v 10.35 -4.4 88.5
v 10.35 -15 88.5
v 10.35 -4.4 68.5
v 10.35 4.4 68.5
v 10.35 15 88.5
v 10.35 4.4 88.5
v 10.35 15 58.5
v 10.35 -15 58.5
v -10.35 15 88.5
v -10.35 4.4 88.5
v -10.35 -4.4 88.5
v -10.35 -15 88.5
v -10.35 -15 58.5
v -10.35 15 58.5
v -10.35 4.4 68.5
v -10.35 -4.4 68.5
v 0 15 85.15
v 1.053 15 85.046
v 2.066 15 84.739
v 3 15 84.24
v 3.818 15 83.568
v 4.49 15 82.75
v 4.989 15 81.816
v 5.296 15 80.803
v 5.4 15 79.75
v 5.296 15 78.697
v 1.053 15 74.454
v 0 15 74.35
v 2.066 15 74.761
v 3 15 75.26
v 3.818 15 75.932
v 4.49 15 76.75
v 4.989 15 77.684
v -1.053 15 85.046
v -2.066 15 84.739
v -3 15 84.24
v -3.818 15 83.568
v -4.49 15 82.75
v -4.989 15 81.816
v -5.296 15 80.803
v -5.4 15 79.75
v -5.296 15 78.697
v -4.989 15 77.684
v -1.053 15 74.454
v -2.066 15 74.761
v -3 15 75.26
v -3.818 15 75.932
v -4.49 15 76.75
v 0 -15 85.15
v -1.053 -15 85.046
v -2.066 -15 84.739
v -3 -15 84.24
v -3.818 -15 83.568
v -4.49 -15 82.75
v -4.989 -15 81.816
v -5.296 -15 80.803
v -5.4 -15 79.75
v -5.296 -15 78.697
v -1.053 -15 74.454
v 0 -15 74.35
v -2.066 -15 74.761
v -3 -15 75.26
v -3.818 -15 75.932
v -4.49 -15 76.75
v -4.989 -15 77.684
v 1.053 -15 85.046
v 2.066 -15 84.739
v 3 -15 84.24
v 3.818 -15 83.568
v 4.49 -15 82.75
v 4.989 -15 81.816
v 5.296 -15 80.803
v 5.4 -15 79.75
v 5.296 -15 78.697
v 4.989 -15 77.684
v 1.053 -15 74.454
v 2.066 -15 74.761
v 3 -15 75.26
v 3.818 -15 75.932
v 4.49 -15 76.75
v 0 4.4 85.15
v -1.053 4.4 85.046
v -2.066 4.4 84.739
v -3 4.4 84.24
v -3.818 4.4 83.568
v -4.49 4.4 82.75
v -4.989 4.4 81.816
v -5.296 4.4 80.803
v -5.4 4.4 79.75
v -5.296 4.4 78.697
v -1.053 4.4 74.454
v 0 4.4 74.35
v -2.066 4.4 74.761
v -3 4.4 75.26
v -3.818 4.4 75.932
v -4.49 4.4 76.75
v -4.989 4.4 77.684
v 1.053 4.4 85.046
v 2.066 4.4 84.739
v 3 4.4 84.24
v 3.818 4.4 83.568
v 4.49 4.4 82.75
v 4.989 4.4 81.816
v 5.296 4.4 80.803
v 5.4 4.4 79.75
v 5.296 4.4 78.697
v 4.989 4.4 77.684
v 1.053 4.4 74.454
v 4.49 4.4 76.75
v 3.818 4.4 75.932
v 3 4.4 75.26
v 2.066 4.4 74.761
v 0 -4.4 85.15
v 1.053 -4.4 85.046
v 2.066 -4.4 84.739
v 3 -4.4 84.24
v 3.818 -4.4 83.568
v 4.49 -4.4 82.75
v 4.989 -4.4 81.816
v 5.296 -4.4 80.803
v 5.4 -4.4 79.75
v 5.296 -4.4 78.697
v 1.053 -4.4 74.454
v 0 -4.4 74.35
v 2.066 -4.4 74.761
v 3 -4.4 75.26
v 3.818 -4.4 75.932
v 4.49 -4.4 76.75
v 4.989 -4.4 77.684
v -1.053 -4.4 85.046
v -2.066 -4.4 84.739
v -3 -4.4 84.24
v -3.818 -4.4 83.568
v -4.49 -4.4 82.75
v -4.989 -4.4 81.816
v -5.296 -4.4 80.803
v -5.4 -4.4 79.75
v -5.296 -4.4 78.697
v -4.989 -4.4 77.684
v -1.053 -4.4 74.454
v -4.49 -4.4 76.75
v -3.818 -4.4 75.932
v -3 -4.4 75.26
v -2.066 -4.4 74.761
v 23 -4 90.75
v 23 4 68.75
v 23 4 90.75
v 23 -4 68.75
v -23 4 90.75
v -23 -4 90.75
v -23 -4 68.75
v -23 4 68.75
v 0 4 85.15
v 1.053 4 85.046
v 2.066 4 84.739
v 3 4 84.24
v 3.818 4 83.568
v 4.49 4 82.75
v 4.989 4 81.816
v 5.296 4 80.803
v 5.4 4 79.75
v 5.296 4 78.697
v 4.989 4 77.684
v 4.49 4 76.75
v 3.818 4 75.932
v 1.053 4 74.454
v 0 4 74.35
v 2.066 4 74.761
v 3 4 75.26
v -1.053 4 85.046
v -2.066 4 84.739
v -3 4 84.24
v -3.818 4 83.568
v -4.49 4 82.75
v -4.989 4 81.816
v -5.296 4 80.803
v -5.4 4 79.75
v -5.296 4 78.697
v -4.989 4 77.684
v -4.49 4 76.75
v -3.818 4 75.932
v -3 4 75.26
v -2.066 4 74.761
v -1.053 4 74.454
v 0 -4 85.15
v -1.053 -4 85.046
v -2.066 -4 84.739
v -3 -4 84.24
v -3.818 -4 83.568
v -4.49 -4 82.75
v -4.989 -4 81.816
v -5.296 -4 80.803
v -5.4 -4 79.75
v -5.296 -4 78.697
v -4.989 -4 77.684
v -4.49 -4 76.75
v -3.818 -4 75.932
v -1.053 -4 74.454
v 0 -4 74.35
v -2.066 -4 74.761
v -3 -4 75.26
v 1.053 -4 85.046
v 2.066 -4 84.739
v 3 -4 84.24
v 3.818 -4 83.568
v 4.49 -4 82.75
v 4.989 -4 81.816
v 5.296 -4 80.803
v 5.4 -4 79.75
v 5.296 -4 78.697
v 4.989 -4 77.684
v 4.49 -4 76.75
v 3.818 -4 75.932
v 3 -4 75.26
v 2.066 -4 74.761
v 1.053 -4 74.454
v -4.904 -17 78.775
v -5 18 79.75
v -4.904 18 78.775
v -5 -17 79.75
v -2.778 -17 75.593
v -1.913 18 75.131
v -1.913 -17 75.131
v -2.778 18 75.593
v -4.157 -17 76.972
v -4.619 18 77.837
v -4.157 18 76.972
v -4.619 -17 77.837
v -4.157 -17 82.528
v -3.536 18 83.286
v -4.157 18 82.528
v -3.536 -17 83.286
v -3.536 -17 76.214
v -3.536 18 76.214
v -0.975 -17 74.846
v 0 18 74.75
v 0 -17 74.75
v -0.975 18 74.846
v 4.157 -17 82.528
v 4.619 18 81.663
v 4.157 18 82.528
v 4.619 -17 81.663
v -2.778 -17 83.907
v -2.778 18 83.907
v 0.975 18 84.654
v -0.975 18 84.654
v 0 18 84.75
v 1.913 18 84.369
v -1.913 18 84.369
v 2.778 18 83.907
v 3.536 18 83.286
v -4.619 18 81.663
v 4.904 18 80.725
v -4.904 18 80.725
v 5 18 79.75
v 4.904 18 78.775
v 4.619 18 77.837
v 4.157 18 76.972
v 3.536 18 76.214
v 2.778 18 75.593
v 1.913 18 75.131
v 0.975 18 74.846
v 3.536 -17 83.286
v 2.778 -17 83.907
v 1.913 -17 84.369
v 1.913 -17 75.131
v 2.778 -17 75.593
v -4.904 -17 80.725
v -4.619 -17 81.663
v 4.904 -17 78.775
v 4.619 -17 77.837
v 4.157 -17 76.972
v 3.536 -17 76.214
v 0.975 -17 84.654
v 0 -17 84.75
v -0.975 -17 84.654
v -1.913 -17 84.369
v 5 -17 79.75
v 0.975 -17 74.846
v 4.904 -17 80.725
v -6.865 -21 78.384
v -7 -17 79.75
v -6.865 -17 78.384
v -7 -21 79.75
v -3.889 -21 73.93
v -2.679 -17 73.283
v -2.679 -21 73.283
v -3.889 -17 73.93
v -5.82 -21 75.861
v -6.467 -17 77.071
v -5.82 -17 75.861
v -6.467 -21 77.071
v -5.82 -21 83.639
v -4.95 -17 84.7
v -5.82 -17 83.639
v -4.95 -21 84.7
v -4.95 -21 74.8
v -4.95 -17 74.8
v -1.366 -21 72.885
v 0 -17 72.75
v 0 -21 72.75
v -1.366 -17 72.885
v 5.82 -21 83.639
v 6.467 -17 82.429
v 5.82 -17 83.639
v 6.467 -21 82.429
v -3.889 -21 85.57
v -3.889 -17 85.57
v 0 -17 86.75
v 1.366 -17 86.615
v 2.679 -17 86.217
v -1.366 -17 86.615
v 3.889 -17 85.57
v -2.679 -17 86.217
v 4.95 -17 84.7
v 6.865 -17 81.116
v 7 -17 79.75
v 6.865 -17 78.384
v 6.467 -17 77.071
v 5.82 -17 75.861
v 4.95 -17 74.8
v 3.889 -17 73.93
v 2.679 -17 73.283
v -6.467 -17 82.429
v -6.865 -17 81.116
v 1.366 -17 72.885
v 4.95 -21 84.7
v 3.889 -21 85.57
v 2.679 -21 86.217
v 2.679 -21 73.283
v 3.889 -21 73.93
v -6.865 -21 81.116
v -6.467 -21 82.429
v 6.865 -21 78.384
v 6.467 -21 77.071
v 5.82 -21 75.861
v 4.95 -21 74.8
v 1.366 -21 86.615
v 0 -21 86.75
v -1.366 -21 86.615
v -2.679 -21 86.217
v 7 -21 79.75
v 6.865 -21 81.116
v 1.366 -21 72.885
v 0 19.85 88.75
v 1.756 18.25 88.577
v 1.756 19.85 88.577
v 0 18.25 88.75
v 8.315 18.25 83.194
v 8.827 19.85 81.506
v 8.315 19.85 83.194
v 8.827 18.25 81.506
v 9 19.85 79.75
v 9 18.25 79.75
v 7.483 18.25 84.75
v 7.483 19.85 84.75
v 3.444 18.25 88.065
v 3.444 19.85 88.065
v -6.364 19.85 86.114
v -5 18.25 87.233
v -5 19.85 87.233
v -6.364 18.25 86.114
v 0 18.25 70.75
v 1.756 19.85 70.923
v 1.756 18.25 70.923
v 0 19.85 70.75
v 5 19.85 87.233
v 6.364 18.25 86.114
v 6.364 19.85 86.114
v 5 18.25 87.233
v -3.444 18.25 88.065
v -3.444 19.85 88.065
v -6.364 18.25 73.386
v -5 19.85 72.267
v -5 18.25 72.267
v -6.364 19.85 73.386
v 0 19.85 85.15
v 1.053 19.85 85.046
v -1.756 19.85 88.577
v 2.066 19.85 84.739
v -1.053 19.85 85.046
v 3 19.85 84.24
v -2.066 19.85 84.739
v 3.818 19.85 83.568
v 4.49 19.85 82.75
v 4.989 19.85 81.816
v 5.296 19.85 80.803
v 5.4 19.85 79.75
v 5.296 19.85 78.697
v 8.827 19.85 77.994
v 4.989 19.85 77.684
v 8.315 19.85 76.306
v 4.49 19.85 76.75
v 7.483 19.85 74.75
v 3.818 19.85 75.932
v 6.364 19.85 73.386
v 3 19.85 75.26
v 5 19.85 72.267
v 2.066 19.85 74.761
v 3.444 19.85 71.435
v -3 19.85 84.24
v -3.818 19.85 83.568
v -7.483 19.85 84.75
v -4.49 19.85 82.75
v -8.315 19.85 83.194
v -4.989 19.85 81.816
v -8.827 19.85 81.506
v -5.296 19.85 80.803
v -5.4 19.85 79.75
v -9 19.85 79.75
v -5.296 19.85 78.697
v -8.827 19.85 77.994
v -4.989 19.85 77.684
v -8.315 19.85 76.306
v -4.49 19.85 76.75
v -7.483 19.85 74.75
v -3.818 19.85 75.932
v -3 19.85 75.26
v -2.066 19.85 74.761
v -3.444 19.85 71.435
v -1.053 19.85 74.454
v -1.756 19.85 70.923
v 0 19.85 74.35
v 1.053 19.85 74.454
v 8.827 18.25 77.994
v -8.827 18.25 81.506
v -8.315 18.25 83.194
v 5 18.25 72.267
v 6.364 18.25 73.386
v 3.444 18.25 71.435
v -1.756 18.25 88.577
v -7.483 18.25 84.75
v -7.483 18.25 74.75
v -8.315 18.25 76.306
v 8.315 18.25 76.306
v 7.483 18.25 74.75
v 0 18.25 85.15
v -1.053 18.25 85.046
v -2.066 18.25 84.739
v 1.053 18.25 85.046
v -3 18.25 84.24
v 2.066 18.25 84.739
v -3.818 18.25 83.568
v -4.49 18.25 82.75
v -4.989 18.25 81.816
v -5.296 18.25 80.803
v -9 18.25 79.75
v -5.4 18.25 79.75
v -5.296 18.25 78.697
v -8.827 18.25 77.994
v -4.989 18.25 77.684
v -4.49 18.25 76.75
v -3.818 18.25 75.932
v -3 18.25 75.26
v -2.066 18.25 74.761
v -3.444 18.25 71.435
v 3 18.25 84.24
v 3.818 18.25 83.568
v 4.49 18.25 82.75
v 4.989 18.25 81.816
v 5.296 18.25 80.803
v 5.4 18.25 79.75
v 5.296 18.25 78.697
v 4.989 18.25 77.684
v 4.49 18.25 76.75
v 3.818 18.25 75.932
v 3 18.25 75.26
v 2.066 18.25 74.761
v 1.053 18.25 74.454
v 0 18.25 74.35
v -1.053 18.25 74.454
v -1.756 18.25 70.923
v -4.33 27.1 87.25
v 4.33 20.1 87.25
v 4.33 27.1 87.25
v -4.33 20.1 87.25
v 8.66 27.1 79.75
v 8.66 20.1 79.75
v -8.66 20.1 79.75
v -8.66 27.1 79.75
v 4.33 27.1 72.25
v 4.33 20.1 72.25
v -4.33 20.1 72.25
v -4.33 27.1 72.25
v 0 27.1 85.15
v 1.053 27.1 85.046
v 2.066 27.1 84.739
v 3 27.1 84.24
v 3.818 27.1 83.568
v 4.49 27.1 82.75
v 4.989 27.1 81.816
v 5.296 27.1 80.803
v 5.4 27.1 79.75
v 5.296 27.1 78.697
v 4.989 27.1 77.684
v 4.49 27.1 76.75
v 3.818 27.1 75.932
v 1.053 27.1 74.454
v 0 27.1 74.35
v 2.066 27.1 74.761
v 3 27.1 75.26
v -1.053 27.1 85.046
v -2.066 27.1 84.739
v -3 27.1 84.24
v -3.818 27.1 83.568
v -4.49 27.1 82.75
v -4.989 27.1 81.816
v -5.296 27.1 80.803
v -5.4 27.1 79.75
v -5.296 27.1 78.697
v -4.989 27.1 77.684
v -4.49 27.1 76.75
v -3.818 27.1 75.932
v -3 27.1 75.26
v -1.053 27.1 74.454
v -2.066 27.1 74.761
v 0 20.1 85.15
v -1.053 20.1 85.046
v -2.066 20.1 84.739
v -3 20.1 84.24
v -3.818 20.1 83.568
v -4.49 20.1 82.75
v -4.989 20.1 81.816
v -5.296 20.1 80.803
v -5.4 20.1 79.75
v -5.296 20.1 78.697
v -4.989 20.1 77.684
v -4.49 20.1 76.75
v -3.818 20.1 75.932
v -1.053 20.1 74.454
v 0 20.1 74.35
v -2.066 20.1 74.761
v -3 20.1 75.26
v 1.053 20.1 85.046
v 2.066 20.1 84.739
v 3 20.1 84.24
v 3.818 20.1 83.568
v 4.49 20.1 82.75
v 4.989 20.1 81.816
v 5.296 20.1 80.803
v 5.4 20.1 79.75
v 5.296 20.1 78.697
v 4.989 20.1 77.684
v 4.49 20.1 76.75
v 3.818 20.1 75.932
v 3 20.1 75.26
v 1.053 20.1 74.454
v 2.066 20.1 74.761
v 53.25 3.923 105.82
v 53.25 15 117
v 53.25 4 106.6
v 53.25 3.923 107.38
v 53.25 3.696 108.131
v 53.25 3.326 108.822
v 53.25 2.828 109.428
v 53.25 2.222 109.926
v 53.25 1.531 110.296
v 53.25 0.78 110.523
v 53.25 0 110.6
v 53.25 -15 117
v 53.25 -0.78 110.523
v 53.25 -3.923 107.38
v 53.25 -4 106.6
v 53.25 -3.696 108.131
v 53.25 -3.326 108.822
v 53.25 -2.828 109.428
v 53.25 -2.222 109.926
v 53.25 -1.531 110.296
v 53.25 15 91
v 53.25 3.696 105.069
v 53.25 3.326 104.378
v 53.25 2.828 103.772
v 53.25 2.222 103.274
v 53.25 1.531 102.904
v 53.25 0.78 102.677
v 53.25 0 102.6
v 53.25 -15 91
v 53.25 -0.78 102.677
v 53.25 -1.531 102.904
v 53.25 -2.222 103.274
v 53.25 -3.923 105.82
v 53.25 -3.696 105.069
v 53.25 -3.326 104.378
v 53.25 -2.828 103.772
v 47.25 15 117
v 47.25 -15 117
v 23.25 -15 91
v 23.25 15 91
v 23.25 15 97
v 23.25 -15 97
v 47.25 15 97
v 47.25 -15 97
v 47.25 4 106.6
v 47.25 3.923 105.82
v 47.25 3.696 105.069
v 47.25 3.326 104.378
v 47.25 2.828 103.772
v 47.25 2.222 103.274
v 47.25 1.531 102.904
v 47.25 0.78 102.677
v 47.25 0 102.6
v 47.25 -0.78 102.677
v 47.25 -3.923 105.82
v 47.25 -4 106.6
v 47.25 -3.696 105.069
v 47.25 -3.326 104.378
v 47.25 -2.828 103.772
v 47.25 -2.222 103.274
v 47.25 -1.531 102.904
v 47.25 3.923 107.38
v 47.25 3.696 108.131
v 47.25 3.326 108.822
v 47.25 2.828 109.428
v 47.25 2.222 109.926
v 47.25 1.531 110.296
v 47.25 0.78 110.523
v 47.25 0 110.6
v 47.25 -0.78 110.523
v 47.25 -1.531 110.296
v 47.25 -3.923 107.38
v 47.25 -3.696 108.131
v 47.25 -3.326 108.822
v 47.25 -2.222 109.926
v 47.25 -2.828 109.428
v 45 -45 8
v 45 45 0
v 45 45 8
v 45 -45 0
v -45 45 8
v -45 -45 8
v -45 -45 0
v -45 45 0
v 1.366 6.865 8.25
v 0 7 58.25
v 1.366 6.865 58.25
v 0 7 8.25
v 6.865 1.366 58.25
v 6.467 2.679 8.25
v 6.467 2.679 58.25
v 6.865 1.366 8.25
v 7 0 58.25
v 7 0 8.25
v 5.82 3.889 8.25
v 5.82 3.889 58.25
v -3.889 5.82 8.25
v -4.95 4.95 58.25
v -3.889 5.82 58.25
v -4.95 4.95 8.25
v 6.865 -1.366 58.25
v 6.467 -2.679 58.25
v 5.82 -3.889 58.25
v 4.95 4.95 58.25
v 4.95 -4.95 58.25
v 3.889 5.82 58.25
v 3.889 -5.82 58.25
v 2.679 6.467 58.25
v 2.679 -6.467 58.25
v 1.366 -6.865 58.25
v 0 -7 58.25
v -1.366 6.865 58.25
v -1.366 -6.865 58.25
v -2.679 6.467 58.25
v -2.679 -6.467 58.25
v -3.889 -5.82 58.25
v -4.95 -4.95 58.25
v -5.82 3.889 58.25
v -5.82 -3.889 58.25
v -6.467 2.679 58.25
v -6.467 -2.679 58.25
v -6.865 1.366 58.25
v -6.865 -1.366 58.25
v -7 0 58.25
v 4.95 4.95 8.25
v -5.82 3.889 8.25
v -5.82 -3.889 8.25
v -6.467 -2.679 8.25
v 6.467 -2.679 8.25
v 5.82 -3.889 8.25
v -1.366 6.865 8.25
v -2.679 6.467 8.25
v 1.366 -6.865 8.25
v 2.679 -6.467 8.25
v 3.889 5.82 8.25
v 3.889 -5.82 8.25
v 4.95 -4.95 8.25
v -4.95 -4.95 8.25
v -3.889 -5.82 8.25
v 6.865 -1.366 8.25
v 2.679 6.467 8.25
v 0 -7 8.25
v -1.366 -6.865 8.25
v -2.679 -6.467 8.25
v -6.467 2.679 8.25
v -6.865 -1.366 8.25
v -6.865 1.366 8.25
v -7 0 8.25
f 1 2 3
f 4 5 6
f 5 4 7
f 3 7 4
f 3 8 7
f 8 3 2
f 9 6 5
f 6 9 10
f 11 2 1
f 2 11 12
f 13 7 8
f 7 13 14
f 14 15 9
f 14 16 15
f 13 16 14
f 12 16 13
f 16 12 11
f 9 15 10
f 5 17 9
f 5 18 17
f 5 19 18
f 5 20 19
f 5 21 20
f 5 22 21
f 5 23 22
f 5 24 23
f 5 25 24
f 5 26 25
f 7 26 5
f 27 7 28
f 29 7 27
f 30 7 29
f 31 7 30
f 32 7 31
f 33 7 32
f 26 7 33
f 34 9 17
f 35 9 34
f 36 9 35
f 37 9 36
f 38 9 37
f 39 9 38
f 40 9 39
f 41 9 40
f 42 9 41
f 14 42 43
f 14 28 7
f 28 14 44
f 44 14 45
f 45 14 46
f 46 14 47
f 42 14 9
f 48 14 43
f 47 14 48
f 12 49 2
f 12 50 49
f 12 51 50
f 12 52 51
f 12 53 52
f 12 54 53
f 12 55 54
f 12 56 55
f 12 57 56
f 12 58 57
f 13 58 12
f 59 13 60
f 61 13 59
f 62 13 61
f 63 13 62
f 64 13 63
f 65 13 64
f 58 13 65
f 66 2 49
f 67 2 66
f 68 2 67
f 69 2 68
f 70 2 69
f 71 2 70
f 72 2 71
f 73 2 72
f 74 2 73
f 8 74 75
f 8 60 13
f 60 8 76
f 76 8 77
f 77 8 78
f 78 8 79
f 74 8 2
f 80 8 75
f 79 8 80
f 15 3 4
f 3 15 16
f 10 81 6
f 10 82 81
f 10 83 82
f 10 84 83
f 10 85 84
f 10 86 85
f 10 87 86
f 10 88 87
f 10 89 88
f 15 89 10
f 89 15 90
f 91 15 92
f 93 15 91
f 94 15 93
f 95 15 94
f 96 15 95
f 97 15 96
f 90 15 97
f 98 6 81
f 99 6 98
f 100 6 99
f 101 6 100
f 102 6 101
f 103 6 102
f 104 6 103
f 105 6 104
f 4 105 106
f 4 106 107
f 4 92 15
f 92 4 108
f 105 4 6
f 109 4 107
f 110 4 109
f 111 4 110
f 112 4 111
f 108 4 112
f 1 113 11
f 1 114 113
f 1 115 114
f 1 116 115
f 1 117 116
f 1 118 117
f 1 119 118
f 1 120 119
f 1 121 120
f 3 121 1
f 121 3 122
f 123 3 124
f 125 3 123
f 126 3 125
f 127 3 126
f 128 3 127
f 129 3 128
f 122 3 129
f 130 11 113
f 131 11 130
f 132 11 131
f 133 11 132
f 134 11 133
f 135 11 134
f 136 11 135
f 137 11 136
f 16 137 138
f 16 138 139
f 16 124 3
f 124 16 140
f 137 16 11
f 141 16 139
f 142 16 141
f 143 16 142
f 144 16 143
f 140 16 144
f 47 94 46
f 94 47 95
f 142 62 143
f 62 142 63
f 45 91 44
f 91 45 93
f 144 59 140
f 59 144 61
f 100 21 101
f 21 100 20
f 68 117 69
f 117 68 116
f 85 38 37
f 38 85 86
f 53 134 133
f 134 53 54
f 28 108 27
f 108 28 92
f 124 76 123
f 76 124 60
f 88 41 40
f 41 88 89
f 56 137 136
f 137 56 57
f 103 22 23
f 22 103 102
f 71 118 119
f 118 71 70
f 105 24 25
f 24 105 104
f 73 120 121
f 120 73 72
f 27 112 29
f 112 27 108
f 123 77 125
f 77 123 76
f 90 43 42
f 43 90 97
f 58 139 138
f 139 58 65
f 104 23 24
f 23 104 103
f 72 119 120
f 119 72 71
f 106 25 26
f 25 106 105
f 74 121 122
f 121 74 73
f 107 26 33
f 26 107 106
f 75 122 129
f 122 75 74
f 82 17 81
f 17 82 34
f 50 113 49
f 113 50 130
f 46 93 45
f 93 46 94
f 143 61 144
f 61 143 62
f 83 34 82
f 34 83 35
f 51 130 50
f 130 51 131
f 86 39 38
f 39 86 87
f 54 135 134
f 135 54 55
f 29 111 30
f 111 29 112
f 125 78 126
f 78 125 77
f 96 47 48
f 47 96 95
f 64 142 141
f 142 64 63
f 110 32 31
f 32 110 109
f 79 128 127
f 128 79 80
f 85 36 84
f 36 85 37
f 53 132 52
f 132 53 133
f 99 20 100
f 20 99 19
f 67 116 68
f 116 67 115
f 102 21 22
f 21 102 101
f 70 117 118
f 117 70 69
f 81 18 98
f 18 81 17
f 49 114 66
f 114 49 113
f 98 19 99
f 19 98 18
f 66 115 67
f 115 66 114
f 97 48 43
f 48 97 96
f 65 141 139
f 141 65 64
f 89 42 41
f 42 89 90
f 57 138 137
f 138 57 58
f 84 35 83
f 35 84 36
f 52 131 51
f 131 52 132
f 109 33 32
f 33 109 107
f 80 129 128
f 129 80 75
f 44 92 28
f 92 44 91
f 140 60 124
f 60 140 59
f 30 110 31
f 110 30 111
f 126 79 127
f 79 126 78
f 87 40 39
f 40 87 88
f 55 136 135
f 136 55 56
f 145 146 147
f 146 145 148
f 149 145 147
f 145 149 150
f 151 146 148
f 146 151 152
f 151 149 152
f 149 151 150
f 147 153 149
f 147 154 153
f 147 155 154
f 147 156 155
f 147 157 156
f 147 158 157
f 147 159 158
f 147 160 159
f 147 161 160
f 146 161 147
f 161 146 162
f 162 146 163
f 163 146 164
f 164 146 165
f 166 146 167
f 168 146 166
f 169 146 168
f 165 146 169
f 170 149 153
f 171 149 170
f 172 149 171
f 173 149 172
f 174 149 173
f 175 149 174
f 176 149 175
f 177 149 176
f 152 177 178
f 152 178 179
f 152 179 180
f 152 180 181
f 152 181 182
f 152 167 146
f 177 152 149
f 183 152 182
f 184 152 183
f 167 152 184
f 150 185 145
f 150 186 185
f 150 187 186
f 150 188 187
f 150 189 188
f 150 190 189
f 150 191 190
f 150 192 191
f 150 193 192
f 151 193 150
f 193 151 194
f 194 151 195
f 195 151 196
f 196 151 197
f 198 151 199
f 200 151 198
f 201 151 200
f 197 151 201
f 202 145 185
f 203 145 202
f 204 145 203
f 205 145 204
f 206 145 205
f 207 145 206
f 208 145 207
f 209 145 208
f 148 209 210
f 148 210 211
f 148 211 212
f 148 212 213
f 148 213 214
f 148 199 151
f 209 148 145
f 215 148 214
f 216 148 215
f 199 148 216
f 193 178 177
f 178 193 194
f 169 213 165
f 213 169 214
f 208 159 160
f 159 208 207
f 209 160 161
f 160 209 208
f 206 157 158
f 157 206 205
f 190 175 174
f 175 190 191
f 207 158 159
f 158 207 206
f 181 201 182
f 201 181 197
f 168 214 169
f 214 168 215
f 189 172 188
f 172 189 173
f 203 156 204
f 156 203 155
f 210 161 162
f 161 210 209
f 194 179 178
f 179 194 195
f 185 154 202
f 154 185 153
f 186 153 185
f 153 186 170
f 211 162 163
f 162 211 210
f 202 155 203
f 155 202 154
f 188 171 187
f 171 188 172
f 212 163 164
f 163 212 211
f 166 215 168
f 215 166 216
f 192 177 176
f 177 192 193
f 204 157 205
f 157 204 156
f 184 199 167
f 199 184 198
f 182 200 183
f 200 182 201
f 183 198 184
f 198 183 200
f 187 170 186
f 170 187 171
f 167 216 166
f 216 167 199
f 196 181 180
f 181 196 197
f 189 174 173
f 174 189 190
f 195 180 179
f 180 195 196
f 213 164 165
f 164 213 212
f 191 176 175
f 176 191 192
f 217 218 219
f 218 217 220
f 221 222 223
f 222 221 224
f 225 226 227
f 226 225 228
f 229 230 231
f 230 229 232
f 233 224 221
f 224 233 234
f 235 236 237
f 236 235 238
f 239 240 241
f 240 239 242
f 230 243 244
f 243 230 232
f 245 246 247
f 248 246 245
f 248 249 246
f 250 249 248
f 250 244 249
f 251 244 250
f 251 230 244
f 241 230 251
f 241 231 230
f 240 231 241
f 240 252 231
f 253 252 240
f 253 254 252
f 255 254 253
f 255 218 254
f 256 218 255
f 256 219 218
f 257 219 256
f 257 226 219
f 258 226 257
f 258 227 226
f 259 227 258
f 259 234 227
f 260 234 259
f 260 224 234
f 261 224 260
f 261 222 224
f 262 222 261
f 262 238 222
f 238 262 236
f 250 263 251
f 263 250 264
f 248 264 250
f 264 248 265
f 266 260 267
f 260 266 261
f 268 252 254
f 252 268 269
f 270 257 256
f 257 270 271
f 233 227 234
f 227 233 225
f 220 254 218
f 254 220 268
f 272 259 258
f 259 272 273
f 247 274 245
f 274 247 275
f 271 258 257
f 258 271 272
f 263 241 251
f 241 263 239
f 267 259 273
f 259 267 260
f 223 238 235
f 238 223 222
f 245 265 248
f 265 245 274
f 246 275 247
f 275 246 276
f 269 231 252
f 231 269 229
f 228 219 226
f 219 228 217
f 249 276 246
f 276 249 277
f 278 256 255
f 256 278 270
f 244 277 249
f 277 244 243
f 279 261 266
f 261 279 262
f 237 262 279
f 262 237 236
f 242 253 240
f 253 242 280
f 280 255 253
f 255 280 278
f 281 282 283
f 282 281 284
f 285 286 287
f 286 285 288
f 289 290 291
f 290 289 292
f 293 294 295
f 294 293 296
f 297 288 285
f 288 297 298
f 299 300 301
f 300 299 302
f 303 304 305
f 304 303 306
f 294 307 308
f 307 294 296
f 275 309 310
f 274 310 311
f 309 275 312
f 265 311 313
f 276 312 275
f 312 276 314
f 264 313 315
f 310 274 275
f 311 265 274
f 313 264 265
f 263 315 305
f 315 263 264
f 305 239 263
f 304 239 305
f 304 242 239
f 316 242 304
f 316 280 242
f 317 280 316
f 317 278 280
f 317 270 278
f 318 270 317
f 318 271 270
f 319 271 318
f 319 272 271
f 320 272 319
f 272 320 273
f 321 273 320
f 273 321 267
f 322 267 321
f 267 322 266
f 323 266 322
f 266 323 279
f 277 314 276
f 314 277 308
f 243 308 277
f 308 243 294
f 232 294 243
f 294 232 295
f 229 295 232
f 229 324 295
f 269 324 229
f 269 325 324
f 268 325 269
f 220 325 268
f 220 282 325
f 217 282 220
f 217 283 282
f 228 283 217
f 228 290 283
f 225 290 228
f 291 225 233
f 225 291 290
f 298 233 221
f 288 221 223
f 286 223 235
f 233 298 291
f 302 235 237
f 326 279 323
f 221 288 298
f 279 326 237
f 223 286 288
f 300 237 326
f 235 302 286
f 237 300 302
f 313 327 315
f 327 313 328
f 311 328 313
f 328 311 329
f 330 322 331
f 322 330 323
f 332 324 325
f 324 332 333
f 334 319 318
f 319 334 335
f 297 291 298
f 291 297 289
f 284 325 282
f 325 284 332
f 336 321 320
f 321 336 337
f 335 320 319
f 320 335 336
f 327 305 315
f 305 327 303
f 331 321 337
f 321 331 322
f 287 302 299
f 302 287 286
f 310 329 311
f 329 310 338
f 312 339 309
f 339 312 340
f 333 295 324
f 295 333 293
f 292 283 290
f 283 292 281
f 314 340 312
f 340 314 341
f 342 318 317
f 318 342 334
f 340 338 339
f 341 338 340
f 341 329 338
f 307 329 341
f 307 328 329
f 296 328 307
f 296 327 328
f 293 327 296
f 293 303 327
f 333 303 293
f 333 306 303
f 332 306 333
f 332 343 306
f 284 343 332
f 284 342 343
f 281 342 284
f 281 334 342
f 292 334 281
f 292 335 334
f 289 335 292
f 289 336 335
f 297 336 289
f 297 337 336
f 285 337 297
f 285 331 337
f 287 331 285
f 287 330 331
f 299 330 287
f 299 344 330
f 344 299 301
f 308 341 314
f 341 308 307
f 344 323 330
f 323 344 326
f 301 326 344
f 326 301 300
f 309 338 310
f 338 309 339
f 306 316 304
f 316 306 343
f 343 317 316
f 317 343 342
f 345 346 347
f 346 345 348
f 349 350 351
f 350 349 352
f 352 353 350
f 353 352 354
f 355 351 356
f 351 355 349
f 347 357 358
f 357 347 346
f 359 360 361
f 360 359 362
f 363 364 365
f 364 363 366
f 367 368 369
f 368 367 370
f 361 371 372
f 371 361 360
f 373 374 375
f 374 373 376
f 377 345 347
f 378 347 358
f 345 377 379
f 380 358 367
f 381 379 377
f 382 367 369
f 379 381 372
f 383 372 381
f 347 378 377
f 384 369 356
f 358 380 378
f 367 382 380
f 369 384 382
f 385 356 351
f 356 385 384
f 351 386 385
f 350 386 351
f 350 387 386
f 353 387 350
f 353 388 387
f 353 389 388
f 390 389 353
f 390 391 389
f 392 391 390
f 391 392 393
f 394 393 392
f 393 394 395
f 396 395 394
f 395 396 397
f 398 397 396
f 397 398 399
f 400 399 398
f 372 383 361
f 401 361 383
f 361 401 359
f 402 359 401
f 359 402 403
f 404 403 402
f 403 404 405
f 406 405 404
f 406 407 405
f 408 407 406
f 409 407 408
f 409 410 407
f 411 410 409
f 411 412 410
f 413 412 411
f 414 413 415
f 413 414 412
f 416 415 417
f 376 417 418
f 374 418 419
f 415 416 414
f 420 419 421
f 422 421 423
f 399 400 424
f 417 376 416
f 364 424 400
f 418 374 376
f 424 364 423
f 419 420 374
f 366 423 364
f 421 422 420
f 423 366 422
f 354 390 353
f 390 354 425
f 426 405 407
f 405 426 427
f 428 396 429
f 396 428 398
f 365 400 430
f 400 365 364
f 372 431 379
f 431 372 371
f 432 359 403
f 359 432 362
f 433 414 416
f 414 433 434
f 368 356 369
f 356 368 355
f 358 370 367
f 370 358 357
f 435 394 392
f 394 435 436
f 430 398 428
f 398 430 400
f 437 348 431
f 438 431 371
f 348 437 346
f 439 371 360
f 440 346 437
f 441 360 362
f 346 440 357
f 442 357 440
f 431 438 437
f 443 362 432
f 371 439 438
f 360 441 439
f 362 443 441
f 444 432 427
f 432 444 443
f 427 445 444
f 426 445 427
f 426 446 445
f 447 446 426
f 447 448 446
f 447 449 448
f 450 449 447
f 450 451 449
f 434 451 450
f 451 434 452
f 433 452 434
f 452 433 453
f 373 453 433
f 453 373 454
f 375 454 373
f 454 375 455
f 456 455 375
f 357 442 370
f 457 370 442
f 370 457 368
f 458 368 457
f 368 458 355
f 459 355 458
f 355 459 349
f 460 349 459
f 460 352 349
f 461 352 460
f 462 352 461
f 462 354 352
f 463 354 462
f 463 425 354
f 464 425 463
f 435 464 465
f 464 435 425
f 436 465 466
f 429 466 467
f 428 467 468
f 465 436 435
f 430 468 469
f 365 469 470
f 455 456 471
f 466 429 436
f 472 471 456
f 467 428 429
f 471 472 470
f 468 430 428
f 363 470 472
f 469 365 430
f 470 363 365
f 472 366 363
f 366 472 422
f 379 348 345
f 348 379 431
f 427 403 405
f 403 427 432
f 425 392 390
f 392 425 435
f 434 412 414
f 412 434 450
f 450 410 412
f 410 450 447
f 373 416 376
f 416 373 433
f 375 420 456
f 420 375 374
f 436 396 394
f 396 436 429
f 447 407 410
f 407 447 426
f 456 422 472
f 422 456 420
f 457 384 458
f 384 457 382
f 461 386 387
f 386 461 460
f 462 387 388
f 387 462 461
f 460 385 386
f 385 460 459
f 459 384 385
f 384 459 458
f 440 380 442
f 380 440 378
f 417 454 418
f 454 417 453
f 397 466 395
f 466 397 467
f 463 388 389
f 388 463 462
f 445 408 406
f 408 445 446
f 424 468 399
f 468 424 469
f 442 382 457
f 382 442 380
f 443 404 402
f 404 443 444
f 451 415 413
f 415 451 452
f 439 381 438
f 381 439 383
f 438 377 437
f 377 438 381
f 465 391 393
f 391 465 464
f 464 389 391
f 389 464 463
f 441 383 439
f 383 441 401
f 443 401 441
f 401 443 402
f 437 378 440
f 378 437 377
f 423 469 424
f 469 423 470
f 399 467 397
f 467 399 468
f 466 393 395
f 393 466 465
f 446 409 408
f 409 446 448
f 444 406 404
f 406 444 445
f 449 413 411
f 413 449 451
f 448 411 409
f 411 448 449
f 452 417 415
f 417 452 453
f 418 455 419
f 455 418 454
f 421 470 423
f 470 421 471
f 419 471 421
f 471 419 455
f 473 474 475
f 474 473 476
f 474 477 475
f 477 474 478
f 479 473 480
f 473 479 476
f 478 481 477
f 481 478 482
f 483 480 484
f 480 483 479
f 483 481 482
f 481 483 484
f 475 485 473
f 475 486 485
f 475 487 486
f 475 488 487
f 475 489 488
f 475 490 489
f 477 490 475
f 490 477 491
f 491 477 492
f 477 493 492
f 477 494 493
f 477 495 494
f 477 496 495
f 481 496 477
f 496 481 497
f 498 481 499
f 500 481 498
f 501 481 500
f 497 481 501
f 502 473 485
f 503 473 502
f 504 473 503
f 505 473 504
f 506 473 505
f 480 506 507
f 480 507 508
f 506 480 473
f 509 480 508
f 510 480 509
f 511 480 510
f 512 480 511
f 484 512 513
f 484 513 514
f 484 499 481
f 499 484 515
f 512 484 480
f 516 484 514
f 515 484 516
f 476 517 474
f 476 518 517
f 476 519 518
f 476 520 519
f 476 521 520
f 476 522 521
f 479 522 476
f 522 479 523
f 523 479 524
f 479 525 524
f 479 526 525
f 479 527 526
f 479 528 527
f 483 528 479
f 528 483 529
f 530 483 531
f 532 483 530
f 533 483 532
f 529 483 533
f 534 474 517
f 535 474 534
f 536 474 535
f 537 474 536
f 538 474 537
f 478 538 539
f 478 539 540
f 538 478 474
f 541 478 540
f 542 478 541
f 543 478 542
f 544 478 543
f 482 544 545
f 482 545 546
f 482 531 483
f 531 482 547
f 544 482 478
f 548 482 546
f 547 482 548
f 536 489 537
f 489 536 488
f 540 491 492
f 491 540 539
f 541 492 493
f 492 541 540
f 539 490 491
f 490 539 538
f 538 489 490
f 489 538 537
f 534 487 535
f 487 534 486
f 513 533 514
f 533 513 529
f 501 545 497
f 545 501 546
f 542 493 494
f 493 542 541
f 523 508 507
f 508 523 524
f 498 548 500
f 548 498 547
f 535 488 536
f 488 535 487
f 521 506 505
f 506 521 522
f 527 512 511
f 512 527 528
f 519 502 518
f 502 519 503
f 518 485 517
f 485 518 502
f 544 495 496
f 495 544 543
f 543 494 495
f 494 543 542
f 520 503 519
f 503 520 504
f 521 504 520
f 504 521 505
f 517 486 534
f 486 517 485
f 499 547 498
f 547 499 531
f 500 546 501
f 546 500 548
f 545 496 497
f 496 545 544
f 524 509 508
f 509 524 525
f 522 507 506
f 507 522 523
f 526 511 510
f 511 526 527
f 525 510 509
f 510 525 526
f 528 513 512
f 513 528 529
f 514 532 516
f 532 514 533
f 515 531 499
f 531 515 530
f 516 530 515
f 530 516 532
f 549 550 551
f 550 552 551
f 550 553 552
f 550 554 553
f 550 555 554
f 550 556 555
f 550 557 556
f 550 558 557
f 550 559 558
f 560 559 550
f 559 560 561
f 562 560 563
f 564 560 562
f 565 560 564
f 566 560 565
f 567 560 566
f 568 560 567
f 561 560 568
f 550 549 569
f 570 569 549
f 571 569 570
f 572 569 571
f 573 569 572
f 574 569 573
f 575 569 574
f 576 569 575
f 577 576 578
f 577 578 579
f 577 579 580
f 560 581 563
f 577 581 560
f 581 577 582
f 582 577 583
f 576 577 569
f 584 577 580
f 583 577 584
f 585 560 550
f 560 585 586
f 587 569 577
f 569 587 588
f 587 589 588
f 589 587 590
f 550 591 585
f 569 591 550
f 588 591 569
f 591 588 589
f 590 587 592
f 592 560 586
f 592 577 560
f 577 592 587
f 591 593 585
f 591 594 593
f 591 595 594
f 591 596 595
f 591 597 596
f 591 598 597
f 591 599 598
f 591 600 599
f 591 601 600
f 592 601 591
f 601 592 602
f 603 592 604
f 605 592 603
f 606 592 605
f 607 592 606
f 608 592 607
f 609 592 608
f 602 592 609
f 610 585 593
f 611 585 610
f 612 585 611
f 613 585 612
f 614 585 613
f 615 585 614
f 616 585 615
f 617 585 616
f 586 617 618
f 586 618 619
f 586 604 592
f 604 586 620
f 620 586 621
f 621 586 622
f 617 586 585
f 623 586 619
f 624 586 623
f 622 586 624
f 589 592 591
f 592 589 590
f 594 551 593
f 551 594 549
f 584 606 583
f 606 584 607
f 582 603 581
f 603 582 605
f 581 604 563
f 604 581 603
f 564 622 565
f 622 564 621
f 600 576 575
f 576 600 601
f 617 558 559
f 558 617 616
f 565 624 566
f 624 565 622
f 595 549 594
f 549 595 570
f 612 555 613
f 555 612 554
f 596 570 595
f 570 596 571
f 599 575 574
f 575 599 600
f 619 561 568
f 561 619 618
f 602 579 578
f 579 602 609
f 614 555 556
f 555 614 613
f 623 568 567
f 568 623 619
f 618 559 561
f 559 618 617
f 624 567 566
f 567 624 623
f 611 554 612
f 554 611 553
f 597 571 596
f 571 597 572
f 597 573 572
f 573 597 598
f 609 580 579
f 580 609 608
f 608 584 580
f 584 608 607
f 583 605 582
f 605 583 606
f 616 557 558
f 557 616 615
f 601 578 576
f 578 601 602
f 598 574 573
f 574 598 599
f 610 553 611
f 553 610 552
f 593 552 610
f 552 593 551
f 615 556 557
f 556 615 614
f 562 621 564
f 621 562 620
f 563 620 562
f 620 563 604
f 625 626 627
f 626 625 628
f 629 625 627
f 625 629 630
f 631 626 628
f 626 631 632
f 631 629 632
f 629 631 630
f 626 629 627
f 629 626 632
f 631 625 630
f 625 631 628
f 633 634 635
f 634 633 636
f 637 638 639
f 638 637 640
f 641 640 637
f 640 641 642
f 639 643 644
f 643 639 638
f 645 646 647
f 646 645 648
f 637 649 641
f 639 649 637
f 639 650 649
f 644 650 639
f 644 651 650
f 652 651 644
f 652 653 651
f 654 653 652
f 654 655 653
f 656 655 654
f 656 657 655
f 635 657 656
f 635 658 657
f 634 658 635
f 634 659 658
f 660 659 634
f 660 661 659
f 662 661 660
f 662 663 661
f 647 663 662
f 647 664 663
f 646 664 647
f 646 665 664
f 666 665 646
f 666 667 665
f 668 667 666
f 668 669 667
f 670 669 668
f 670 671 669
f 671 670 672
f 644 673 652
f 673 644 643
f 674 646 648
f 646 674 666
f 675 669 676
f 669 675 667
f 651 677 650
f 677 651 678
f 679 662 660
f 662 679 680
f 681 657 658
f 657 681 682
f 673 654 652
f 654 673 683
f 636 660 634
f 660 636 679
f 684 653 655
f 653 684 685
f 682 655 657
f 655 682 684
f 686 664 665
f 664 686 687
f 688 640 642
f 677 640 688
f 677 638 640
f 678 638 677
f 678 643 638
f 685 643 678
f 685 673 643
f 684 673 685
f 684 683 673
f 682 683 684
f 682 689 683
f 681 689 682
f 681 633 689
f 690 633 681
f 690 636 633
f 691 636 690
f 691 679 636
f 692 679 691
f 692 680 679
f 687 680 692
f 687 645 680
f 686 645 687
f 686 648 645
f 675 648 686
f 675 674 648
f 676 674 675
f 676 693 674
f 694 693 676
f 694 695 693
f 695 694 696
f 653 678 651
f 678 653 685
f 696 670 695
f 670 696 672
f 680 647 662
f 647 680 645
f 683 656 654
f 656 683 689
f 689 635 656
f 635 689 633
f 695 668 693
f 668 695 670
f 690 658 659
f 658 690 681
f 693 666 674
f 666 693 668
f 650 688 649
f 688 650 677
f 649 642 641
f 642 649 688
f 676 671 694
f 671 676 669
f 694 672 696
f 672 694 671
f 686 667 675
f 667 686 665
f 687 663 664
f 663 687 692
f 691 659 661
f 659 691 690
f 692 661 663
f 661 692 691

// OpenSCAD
$fn = 32;

// ------------------------------------------------------------------------
// Lamp arm: column d14 x 50 mm, arm 46 mm
// Every part is its own module, assembly() places every instance.
// ------------------------------------------------------------------------

// --- part 1 ---
module lamp_base() {
  difference() {
    translate([-45, -45, 0]) cube([90, 90, 8]);
  }
}

// --- part 2 ---
module lamp_column() {
  cylinder(h = 50, d = 14);
}

// --- part 3 ---
module head_fork() {
  difference() {
    translate([-10.35, -15, 0]) cube([20.7, 30, 30]);
    translate([-11.35, -4.4, 10]) cube([22.7, 8.8, 21]);
    translate([0, 0, 21.25]) rotate([90, 0, 0]) cylinder(h = 32, d = 10.8, center = true);
  }
}

// --- part 4 ---
module lamp_arm() {
  difference() {
    translate([-23, -4, 0]) cube([46, 8, 22]);
    translate([0, 0, 11]) rotate([90, 0, 0]) cylinder(h = 10, d = 10.8, center = true);
  }
}

// --- part 5 ---
module arm_pin() {
  rotate([0, 90, 0]) cylinder(h = 36, d = 10, center = true);
  translate([-21, 0, 0]) rotate([0, 90, 0]) cylinder(h = 4, d = 14);
}

// --- part 6 ---
module arm_washer() {
  difference() {
      translate([0, 0, 0]) cylinder(h = 1.6, d = 18);
      translate([0, 0, -1]) cylinder(h = 3.6, d = 10.8);
    }
}

// --- part 7 ---
module arm_nut() {
  difference() {
    linear_extrude(height = 7) polygon(points = [[8.66, 0], [4.33, 7.5], [-4.33, 7.5], [-8.66, 0], [-4.33, -7.5], [4.33, -7.5]]);
    translate([0, 0, -1]) cylinder(h = 9, d = 10.8);
  }
}

// --- part 8 ---
module shade_bracket() {
  difference() {
    translate([-15, -15, 0]) cube([30, 30, 26]);
    translate([-16, -16, 6]) cube([25, 32, 21]);
    translate([12, 0, 15.6]) rotate([0, 90, 0]) cylinder(h = 8, d = 8, center = true);
  }
}

// --- assembly ---
module assembly() {
  color([0.80, 0.24, 0.20]) translate([0, 0, 0]) rotate([0, 0, 0]) lamp_base();
  color([0.20, 0.45, 0.75]) translate([0, 0, 8.25]) rotate([0, 0, 0]) lamp_column();
  color([0.25, 0.62, 0.32]) translate([0, 0, 58.5]) rotate([0, 0, 0]) head_fork();
  color([0.92, 0.70, 0.18]) translate([0, 0, 68.75]) rotate([0, 0, 0]) lamp_arm();
  color([0.58, 0.35, 0.70]) translate([0, 0, 79.75]) rotate([0, 0, 90]) arm_pin();
  color([0.16, 0.66, 0.66]) translate([0, 19.85, 79.75]) rotate([90, 0, 0]) arm_washer();
  color([0.85, 0.48, 0.18]) translate([0, 27.1, 79.75]) rotate([90, 0, 0]) arm_nut();
  color([0.55, 0.60, 0.65]) translate([38.25, 0, 91]) rotate([0, 0, 0]) shade_bracket();
}

assembly();
